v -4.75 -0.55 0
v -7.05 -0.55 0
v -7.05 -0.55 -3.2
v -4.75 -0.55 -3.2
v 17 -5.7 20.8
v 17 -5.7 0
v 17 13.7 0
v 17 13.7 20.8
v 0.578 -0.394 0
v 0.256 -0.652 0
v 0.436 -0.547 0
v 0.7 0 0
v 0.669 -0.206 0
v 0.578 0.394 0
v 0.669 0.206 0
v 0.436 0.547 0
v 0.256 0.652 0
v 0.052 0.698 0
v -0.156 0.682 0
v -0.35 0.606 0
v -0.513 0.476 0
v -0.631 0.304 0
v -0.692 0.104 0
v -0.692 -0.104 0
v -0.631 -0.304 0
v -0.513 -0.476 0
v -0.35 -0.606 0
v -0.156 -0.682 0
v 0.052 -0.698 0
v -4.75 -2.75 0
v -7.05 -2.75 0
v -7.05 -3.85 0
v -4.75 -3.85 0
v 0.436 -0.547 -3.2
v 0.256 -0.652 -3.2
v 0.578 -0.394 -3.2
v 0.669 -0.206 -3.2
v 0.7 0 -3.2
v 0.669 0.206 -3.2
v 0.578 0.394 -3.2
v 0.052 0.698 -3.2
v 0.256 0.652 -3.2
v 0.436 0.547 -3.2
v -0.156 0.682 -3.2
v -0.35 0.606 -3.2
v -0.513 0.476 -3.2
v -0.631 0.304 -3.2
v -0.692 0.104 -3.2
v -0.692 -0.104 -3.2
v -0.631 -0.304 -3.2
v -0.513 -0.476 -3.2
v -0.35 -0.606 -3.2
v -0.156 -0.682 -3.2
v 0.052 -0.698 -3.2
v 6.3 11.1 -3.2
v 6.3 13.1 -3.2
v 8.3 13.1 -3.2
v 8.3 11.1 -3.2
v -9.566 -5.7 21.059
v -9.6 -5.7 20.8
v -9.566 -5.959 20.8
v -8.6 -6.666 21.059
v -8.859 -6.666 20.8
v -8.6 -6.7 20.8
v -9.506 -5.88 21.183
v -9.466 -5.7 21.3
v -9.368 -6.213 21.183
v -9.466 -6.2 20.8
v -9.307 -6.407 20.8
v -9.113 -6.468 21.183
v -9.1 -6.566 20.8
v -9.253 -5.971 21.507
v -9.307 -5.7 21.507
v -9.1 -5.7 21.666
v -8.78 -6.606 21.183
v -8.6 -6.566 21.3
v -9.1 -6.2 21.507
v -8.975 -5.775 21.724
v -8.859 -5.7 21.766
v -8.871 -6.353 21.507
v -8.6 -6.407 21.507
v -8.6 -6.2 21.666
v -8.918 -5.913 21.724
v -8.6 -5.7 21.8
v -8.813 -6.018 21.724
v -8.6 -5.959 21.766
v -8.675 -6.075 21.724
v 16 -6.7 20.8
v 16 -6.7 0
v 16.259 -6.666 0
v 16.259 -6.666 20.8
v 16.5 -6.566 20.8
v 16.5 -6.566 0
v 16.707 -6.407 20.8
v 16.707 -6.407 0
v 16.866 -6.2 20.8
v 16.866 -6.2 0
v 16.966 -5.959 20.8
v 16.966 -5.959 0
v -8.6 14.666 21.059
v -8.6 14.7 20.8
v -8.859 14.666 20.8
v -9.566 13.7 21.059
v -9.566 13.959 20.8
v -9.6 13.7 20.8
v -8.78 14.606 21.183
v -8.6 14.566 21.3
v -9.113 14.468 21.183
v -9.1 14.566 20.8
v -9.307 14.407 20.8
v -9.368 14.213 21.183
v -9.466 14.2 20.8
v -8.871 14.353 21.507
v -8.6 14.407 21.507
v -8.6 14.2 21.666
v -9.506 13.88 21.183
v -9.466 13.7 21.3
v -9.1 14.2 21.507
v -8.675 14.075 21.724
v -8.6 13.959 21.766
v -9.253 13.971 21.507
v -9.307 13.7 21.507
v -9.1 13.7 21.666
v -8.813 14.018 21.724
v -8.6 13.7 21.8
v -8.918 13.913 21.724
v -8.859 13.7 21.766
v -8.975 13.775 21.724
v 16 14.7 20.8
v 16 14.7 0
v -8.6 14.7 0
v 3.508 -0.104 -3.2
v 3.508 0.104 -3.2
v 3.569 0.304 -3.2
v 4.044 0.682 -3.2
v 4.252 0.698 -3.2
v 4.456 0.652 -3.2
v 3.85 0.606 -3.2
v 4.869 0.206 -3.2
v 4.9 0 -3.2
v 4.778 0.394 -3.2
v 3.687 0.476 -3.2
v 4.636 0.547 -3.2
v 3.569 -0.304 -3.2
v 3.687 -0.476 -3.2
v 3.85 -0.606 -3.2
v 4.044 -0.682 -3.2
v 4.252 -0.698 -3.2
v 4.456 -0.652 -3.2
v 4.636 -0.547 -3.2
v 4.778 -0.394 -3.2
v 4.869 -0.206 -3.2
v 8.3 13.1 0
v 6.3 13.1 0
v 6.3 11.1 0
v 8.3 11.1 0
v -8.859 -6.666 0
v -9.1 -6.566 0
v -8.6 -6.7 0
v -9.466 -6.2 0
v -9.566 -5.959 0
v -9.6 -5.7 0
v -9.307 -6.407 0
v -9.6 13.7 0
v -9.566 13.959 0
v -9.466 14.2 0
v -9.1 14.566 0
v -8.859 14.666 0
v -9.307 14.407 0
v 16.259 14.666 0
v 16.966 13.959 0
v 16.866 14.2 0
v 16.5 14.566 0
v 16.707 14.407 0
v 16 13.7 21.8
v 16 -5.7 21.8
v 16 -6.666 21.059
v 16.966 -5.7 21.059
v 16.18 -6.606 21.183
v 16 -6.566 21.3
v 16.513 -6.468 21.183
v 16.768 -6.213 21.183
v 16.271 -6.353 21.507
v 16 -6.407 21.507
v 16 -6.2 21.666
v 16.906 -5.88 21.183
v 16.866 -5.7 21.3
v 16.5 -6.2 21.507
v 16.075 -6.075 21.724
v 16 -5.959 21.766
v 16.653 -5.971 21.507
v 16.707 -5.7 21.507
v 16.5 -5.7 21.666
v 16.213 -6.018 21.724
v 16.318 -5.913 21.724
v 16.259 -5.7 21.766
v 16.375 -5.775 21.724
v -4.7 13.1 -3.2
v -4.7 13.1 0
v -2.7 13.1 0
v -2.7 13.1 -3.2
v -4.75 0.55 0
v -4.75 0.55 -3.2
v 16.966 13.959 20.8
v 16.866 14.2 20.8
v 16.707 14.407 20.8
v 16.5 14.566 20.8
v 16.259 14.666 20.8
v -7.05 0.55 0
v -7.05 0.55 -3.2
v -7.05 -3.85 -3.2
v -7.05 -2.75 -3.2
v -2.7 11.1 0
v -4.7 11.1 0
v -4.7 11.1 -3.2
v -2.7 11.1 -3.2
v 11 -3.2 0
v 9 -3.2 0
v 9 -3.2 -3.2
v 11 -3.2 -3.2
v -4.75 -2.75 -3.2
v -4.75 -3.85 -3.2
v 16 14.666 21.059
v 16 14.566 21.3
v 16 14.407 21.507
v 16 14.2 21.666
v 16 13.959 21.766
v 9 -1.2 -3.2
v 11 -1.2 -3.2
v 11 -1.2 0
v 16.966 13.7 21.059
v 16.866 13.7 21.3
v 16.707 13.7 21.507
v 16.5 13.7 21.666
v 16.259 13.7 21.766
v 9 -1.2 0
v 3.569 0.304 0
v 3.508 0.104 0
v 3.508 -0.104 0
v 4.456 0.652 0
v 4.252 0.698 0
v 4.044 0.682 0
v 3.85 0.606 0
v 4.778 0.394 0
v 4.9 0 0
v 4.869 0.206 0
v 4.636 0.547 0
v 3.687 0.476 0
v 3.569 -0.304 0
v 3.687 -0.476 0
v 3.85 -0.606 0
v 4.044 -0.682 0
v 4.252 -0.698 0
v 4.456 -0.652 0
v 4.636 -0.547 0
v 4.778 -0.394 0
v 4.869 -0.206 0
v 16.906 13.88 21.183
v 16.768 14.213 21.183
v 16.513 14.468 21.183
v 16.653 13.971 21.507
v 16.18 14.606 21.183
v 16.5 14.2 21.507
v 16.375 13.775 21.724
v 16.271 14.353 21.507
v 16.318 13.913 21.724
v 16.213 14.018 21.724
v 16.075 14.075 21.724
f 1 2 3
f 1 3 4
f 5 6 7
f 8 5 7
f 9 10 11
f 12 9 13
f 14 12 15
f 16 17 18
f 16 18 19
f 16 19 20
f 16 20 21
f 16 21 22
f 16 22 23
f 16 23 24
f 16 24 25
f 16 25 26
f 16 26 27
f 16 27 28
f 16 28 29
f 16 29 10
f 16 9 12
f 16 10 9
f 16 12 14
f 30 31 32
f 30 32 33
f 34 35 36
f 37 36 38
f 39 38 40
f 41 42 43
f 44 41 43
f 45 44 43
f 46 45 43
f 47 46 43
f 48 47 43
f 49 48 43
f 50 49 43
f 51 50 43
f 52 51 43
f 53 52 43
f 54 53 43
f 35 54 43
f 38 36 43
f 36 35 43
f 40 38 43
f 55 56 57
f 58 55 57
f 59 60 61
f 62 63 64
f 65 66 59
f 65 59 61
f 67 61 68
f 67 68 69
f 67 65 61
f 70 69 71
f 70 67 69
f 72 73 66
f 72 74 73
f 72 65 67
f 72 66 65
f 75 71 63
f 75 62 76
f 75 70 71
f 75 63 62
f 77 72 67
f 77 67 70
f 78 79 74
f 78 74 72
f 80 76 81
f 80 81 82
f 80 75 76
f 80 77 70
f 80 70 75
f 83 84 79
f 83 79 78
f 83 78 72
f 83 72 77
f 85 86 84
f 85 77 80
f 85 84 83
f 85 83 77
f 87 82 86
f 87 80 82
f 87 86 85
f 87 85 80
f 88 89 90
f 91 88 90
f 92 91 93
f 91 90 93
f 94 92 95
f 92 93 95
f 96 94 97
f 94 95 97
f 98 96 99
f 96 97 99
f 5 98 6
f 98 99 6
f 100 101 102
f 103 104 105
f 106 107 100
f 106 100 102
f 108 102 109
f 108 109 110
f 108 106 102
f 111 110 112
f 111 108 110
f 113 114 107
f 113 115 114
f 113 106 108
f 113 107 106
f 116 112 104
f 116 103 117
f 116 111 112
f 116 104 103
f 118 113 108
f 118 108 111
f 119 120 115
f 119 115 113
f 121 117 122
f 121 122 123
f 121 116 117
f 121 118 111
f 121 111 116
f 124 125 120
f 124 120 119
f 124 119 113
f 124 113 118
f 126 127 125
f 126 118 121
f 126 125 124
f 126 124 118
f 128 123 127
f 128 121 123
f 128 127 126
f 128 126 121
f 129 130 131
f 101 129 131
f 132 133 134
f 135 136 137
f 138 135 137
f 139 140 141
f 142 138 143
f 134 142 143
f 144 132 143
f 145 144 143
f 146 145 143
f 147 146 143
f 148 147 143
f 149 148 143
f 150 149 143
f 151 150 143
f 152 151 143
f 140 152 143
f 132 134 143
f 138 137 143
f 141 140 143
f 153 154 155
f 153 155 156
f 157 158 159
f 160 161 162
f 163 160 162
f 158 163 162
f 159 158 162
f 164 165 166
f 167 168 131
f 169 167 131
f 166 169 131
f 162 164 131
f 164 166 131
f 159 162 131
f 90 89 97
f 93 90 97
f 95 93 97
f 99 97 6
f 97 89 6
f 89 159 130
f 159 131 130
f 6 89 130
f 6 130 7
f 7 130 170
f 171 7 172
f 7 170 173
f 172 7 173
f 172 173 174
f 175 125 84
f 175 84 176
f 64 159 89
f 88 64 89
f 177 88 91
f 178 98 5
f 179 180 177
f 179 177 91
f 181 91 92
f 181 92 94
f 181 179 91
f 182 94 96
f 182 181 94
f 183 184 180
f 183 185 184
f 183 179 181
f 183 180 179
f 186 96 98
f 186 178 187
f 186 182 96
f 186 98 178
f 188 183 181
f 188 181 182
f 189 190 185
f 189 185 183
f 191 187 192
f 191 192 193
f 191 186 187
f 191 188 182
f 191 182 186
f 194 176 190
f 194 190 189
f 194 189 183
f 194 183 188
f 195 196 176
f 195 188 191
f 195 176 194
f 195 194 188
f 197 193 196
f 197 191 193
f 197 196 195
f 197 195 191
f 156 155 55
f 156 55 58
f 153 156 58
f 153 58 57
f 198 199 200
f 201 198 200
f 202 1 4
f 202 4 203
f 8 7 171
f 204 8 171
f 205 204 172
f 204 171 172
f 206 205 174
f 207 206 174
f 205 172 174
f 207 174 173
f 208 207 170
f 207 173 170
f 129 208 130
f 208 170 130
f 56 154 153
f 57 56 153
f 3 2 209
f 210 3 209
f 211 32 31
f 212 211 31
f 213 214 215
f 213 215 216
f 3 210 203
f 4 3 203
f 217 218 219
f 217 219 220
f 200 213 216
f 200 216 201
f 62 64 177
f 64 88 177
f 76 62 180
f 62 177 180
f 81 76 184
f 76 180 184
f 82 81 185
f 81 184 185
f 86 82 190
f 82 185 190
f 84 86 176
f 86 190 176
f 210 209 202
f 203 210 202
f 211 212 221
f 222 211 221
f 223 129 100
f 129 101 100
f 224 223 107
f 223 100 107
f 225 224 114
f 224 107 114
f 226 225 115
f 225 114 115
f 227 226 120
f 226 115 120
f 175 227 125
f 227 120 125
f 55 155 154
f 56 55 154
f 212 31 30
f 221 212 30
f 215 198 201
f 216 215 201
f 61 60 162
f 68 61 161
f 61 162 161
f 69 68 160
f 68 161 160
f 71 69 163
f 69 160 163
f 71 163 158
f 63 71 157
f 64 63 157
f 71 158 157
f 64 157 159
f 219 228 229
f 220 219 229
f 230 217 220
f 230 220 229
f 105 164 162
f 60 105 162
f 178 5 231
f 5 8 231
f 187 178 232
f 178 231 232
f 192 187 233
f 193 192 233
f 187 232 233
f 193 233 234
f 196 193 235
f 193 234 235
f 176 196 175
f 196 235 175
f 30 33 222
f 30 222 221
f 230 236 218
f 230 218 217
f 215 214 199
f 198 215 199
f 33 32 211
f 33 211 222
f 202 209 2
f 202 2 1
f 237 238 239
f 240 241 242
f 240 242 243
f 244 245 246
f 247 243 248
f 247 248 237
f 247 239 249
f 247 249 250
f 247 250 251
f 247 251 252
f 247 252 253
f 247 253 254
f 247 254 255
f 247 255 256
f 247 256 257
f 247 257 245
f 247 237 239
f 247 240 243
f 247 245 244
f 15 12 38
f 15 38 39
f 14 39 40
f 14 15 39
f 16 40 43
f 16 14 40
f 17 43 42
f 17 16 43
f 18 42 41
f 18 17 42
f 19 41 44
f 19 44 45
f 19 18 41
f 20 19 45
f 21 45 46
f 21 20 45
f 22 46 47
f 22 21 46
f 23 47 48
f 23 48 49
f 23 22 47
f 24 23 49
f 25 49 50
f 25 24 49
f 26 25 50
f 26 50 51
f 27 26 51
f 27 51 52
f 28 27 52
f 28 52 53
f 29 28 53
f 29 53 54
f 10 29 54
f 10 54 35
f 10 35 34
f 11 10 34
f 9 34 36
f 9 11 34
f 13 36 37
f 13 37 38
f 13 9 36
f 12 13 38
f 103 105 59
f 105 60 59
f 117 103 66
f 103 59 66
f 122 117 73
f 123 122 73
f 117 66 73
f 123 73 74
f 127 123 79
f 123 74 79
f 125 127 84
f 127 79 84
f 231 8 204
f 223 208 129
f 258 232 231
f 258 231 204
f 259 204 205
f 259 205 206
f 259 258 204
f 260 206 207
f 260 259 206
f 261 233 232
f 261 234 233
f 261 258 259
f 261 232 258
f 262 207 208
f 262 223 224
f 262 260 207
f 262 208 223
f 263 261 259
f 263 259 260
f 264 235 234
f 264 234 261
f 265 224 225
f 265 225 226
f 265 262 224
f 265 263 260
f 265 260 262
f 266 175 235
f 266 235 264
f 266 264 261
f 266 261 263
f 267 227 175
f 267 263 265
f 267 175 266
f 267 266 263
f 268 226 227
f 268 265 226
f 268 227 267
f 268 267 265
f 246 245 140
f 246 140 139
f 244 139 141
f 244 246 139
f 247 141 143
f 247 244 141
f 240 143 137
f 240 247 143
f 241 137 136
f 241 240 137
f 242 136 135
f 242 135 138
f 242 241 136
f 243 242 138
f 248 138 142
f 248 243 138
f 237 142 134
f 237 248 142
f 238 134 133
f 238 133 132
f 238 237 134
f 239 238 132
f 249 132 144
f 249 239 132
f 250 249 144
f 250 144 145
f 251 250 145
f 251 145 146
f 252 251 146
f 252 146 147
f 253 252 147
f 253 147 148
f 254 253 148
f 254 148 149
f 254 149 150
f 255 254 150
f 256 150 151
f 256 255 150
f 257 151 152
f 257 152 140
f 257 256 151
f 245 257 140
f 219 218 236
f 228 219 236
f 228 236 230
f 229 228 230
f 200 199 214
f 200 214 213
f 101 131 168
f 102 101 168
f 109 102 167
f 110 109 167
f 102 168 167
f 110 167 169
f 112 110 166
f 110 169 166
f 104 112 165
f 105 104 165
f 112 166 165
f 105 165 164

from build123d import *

# Parameters (mm, degrees)
F2_DEPTH = 21.8
F0_W     = 2
F0_H     = 2
F3_DEPTH = 3.2
F0_R     = 0.7
F0_W_2   = 2.3
F0_H_2   = 1.1
F4_R     = 1


with BuildPart() as f2:
    # F1 (on Top) → F2 (new body)
    with BuildSketch(Plane.XY):
        with BuildLine():
            ThreePointArc((-9.6, -5.7), (-9.3071067812, -6.4071067812), (-8.6, -6.7))
            Line((-8.6, -6.7), (16, -6.7))
            ThreePointArc((16, -6.7), (16.7071067812, -6.4071067812), (17, -5.7))
            Line((17, -5.7), (17, 13.7))
            ThreePointArc((17, 13.7), (16.7071067812, 14.4071067812), (16, 14.7))
            Line((16, 14.7), (-8.6, 14.7))
            ThreePointArc((-8.6, 14.7), (-9.3071067812, 14.4071067812), (-9.6, 13.7))
            Line((-9.6, 13.7), (-9.6, -5.7))
        make_face()
    extrude(amount=F2_DEPTH)

    # F4
    f4_edges = [f2.edges().sort_by_distance(p)[0] for p in [
        (-9.6, 4, 21.8),
        (-9.307107, -6.407107, 21.8),
        (3.7, -6.7, 21.8),
        (16.707107, -6.407107, 21.8),
        (17, 4, 21.8),
        (16.707107, 14.407107, 21.8),
        (3.7, 14.7, 21.8),
        (-9.307107, 14.407107, 21.8),
    ]]
    fillet(f4_edges, radius=F4_R)


with BuildPart() as f3:
    # F0 (on Top) → F3 (new body)
    with BuildSketch(Plane.XY):
        with Locations((10, -2.2)):
            Rectangle(F0_W, F0_H)
    extrude(amount=-F3_DEPTH)


with BuildPart() as f3b:
    # F0 (on Top) → F3, piece 2 (new body)
    with BuildSketch(Plane.XY):
        with Locations((7.3, 12.1)):
            Rectangle(F0_W, F0_H)
    extrude(amount=-F3_DEPTH)


with BuildPart() as f3c:
    # F0 (on Top) → F3, piece 3 (new body)
    with BuildSketch(Plane.XY):
        with Locations((4.2, 0)):
            Circle(F0_R)
    extrude(amount=-F3_DEPTH)


with BuildPart() as f3d:
    # F0 (on Top) → F3, piece 4 (new body)
    with BuildSketch(Plane.XY):
        Circle(F0_R)
    extrude(amount=-F3_DEPTH)


with BuildPart() as f3e:
    # F0 (on Top) → F3, piece 5 (new body)
    with BuildSketch(Plane.XY):
        with Locations((-5.9, -3.3)):
            Rectangle(F0_W_2, F0_H_2)
    extrude(amount=-F3_DEPTH)


with BuildPart() as f3f:
    # F0 (on Top) → F3, piece 6 (new body)
    with BuildSketch(Plane.XY):
        with Locations((-5.9, 0)):
            Rectangle(F0_W_2, F0_H_2)
    extrude(amount=-F3_DEPTH)


with BuildPart() as f3g:
    # F0 (on Top) → F3, piece 7 (new body)
    with BuildSketch(Plane.XY):
        with Locations((-3.7, 12.1)):
            Rectangle(F0_W, F0_H)
    extrude(amount=-F3_DEPTH)


solid = Compound([f2.part, f3.part, f3b.part, f3c.part, f3d.part, f3e.part, f3f.part, f3g.part])
